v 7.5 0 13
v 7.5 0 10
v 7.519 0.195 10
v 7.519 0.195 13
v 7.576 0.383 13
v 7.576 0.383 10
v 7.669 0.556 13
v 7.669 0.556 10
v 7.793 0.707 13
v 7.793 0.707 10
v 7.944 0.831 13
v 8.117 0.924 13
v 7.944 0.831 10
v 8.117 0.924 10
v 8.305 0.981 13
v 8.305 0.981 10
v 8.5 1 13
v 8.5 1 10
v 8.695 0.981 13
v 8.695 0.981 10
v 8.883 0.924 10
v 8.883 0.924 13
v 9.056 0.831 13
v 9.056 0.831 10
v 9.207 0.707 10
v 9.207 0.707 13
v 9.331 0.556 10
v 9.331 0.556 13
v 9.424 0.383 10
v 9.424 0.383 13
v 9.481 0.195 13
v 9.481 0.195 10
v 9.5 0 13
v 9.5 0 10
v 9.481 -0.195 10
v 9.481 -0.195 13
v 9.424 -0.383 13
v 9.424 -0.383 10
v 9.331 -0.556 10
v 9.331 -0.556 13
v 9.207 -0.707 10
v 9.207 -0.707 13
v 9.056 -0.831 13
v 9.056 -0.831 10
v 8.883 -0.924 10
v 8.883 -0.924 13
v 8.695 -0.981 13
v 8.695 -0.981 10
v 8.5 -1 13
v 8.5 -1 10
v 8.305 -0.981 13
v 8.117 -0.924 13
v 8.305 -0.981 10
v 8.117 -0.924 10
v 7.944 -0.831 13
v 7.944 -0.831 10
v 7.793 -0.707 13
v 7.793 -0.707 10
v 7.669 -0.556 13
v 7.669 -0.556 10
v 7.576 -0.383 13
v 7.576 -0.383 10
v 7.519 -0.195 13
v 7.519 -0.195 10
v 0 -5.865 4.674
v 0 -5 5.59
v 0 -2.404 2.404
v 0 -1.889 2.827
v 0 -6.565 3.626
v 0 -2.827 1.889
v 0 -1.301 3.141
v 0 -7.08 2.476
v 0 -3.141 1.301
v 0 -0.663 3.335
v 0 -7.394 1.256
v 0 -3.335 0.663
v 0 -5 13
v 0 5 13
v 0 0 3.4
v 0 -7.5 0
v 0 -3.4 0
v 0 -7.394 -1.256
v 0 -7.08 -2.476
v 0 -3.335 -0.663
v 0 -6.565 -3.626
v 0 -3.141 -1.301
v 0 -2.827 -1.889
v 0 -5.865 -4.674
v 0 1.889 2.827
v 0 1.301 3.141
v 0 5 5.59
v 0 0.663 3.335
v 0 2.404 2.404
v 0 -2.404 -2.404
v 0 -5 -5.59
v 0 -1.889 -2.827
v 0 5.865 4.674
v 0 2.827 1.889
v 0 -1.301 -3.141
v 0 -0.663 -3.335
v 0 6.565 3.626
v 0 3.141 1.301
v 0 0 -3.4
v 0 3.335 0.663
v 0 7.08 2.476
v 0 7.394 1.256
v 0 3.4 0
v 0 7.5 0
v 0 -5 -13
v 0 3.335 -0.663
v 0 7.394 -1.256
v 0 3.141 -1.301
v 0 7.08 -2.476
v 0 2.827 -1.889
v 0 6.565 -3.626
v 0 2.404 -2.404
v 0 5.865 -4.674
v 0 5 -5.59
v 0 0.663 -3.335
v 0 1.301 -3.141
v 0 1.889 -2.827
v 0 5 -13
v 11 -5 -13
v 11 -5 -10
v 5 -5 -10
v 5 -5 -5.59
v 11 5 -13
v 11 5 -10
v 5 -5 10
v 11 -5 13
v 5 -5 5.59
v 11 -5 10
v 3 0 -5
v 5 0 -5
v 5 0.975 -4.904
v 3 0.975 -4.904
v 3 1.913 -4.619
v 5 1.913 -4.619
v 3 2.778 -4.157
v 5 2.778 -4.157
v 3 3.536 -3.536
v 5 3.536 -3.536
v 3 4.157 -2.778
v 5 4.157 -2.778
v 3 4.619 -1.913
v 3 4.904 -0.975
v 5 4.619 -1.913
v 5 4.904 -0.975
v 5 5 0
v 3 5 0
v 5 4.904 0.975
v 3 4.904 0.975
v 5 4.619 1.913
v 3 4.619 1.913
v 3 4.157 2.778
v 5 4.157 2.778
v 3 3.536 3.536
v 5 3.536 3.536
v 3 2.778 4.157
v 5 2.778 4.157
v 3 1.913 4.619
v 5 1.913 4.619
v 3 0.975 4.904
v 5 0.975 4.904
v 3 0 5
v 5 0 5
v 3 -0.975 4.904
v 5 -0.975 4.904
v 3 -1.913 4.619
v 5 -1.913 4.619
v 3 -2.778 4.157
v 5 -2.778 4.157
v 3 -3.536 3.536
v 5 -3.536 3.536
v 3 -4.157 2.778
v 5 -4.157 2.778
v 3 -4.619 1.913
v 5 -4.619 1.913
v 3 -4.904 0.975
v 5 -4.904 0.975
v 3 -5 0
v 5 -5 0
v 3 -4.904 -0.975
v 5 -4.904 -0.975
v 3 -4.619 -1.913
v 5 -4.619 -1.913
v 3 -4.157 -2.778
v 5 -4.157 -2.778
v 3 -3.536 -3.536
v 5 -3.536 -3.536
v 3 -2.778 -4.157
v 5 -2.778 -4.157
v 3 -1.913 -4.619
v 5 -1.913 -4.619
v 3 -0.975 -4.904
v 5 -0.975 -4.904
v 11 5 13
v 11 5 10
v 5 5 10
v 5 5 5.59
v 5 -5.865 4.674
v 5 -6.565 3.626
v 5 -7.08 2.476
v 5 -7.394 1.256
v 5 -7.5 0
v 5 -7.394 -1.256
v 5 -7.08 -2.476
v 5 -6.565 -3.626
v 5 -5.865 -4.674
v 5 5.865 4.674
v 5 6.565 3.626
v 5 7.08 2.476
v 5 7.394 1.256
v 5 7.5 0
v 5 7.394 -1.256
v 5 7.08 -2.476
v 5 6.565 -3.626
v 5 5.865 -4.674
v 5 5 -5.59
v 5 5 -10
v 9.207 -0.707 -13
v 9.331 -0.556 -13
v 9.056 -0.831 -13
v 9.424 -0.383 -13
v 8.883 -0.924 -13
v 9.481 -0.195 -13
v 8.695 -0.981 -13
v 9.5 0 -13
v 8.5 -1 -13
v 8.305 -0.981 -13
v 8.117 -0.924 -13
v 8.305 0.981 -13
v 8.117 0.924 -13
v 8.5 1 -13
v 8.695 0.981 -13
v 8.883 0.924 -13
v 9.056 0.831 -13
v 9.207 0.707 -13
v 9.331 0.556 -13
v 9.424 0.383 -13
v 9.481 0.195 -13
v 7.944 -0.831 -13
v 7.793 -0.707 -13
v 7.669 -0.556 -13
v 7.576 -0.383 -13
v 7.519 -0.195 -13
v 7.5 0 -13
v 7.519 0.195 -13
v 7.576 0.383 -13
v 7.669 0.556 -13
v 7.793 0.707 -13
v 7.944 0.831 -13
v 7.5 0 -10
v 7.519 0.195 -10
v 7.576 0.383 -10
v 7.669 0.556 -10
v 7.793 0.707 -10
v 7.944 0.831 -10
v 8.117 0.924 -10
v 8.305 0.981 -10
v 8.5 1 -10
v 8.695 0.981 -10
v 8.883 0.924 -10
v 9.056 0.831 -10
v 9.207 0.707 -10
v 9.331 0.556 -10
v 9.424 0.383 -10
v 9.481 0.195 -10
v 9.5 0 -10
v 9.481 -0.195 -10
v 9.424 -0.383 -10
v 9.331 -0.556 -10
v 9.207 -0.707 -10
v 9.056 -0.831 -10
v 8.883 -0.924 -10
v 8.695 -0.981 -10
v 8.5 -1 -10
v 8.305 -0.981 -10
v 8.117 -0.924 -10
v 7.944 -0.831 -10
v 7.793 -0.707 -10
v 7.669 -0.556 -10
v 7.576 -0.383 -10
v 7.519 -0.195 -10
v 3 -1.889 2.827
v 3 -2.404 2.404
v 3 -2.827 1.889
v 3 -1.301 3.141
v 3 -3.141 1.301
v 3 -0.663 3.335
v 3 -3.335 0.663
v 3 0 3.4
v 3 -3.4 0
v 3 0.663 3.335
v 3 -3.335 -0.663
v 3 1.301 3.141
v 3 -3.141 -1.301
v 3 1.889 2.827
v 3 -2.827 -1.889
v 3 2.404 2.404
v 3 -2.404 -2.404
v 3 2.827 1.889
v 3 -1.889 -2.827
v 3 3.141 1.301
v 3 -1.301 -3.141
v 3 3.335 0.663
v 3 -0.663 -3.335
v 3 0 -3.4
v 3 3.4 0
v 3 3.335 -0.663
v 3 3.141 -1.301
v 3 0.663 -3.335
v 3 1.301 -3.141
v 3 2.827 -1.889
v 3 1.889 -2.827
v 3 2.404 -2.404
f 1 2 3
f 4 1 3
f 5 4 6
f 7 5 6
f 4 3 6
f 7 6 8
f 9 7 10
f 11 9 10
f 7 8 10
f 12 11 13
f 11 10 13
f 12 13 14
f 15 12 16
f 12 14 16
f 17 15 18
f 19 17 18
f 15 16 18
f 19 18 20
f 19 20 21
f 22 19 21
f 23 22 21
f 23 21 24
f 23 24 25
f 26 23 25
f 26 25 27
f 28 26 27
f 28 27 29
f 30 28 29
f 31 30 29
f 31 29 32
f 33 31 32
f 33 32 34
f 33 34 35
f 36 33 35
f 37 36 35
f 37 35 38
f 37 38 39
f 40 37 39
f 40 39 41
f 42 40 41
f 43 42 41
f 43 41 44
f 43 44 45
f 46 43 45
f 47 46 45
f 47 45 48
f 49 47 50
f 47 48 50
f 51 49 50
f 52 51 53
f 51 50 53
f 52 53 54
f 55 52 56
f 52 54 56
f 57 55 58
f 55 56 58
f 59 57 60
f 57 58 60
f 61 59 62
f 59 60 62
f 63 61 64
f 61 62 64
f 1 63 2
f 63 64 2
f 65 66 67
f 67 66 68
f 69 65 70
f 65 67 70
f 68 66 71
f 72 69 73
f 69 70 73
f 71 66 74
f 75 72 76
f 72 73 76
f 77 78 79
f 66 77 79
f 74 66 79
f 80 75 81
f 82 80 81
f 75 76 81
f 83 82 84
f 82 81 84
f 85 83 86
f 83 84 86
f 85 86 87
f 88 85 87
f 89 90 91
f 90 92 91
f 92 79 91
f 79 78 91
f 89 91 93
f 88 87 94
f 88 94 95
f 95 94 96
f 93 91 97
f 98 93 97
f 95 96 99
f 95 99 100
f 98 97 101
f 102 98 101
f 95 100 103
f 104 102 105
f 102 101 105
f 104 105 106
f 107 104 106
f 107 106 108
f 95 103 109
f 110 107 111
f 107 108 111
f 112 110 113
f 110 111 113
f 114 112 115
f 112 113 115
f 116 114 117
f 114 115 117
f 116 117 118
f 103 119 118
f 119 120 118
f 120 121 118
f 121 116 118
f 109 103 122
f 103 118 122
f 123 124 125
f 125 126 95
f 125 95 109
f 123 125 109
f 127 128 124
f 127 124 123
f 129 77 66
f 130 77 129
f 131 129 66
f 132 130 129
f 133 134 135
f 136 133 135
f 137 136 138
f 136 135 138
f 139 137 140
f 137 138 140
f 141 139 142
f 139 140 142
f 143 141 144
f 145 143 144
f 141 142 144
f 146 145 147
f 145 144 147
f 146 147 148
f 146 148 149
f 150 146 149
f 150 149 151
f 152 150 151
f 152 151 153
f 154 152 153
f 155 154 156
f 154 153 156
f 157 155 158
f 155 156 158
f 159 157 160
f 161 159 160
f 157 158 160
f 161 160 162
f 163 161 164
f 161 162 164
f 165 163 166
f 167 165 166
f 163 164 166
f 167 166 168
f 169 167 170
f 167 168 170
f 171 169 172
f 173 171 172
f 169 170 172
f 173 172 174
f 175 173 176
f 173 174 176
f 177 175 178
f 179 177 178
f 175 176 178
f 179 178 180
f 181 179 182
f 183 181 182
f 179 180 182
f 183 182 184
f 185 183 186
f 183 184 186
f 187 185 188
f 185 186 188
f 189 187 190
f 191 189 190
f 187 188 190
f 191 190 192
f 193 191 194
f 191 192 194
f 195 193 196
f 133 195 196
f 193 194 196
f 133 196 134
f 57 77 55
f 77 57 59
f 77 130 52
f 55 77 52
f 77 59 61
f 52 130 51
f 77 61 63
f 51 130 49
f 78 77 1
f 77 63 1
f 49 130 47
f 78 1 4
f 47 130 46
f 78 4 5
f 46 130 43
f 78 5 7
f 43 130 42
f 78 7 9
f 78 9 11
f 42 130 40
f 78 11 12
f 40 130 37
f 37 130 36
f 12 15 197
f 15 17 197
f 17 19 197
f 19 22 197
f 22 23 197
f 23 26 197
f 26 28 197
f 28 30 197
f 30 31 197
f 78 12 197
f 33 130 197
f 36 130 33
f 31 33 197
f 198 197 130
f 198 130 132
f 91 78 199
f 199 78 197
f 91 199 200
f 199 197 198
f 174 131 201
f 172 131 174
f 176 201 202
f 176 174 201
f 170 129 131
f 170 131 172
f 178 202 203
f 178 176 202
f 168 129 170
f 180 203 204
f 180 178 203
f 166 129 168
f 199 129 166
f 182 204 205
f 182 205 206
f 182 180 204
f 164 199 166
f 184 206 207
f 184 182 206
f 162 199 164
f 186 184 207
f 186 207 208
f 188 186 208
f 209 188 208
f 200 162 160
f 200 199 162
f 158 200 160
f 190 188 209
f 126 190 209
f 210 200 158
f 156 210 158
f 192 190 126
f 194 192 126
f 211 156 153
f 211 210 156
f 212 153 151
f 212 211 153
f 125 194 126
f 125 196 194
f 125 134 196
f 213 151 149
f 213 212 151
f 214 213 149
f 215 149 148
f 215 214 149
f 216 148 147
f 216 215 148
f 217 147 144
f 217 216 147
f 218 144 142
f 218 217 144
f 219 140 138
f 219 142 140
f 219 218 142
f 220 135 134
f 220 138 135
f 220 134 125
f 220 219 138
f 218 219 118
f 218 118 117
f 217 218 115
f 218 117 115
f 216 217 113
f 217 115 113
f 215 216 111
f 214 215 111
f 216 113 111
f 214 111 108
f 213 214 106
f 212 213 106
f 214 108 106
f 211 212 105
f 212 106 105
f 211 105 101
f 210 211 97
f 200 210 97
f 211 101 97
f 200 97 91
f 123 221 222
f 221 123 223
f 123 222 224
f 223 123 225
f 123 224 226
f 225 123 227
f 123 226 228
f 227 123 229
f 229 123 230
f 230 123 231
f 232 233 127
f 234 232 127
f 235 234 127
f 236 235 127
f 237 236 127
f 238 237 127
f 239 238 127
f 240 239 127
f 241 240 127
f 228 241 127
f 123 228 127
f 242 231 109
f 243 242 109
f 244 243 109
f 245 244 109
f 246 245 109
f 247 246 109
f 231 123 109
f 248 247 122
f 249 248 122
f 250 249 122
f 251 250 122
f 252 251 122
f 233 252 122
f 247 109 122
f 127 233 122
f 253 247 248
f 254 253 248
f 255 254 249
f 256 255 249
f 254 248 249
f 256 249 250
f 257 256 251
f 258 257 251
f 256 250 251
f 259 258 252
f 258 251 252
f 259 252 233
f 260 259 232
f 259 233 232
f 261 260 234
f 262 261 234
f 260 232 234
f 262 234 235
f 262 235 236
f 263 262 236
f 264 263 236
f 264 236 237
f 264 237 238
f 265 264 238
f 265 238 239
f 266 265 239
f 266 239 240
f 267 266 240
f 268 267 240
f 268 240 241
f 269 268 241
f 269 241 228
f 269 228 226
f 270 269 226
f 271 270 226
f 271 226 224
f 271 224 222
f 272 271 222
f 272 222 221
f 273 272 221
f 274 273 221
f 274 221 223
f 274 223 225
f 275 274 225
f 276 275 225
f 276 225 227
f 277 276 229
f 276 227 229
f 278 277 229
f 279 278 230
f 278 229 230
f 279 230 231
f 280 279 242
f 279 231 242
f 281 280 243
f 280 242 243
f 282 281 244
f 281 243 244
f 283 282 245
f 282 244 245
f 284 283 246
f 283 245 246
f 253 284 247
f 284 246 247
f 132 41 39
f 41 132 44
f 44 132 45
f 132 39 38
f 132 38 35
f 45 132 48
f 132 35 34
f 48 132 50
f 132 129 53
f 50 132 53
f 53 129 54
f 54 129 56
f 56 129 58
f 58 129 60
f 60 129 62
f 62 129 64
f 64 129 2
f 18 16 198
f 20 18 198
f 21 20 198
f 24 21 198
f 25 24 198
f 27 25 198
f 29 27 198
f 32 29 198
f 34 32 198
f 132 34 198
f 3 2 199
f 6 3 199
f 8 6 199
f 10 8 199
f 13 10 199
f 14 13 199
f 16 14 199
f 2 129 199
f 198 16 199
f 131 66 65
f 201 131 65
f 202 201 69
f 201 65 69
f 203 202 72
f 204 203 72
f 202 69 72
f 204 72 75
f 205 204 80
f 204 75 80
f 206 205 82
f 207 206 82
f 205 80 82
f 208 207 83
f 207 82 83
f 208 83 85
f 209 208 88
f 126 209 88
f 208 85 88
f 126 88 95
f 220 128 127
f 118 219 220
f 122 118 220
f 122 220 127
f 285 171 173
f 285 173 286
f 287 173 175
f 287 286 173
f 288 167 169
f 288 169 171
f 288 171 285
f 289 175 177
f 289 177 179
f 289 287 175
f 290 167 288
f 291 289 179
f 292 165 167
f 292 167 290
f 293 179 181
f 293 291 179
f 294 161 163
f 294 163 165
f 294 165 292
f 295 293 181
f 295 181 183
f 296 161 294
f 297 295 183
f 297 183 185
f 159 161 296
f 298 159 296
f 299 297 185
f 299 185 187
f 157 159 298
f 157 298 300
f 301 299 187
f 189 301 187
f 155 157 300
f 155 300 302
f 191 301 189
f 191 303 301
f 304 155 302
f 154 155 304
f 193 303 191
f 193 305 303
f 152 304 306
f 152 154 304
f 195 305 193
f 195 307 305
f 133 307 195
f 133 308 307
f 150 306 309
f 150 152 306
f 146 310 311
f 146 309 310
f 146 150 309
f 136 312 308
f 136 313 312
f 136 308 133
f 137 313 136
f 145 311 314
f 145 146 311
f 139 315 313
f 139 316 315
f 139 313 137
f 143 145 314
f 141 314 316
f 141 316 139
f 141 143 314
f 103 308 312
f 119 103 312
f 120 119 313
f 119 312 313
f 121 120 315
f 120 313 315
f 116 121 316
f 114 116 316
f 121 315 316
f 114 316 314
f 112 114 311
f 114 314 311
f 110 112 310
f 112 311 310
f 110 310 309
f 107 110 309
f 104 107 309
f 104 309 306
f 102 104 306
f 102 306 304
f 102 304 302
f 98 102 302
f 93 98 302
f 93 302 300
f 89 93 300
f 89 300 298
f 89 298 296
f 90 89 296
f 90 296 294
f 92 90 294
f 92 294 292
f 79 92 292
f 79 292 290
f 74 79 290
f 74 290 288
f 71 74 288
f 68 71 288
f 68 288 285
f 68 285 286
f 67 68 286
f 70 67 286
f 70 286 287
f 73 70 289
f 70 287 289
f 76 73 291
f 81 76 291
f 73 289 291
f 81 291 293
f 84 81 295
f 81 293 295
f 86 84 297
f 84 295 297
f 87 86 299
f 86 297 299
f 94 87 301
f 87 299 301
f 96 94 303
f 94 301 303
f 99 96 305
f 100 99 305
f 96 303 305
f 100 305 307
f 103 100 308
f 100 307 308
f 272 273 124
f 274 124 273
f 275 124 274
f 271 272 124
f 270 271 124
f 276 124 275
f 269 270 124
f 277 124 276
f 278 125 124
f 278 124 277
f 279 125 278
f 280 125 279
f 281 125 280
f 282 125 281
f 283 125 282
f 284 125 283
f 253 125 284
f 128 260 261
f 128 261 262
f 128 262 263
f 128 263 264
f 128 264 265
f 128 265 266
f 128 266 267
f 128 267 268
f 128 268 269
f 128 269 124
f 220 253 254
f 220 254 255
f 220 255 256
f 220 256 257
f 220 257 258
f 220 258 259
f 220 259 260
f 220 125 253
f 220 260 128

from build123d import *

# Parameters (mm, degrees)
SKETCH_1_R          = 7.5
EXTRUDE_1_DEPTH     = 5
SKETCH_2_R          = 5
CUT_EXTRUDE_1_DEPTH = 2
SKETCH_3_R          = 3.4
CUT_EXTRUDE_2_DEPTH = 12.022703843
SKETCH_4_W          = 7.409830056
SKETCH_4_H          = 10
EXTRUDE_3_DEPTH     = 5
SKETCH_5_W          = 3
SKETCH_5_H          = 10
EXTRUDE_4_DEPTH     = 6
SKETCH_6_R          = 1
CUT_EXTRUDE_3_DEPTH = 30.210443338


with BuildPart() as part:
    # 草图1 → 凸台-拉伸1 (new body)
    with BuildSketch(Plane(origin=(0, 0, 0), x_dir=(0, 0, -1), z_dir=(1, 0, 0))):
        Circle(SKETCH_1_R)
    extrude(amount=EXTRUDE_1_DEPTH)

    # 草图2 → 切除-拉伸1 (cut)
    with BuildSketch(Plane(origin=(5, 0, 0), x_dir=(0, 0, -1), z_dir=(1, 0, 0))):
        Circle(SKETCH_2_R)
    extrude(amount=-CUT_EXTRUDE_1_DEPTH, mode=Mode.SUBTRACT)

    # 草图3 → 切除-拉伸2 (cut, through all)
    with BuildSketch(Plane(origin=(3, 0, 0), x_dir=(0, 0, -1), z_dir=(1, 0, 0))):
        Circle(SKETCH_3_R)
    extrude(amount=-CUT_EXTRUDE_2_DEPTH, mode=Mode.SUBTRACT)

    # 草图4 → 凸台-拉伸3 (add)
    with BuildSketch(Plane(origin=(5, 0, 0), x_dir=(0, 0, -1), z_dir=(1, 0, 0))):
        with Locations((9.295084972, 0)):
            Rectangle(SKETCH_4_W, SKETCH_4_H)
        with Locations((-9.295084972, 0)):
            Rectangle(SKETCH_4_W, SKETCH_4_H)
    extrude(amount=-EXTRUDE_3_DEPTH)

    # 草图5 → 凸台-拉伸4 (add)
    with BuildSketch(Plane(origin=(5, 0, 0), x_dir=(0, 0, -1), z_dir=(1, 0, 0))):
        with Locations((11.5, 0)):
            Rectangle(SKETCH_5_W, SKETCH_5_H)
        with Locations((-11.5, 0)):
            Rectangle(SKETCH_5_W, SKETCH_5_H)
    extrude(amount=EXTRUDE_4_DEPTH)

    # 草图6 → 切除-拉伸3 (cut, through all)
    with BuildSketch(Plane(origin=(0, 0, -13), x_dir=(-1, 0, 0), z_dir=(0, 0, -1))):
        with Locations((-8.5, 0)):
            Circle(SKETCH_6_R)
    extrude(amount=-CUT_EXTRUDE_3_DEPTH, mode=Mode.SUBTRACT)


solid = part.part
